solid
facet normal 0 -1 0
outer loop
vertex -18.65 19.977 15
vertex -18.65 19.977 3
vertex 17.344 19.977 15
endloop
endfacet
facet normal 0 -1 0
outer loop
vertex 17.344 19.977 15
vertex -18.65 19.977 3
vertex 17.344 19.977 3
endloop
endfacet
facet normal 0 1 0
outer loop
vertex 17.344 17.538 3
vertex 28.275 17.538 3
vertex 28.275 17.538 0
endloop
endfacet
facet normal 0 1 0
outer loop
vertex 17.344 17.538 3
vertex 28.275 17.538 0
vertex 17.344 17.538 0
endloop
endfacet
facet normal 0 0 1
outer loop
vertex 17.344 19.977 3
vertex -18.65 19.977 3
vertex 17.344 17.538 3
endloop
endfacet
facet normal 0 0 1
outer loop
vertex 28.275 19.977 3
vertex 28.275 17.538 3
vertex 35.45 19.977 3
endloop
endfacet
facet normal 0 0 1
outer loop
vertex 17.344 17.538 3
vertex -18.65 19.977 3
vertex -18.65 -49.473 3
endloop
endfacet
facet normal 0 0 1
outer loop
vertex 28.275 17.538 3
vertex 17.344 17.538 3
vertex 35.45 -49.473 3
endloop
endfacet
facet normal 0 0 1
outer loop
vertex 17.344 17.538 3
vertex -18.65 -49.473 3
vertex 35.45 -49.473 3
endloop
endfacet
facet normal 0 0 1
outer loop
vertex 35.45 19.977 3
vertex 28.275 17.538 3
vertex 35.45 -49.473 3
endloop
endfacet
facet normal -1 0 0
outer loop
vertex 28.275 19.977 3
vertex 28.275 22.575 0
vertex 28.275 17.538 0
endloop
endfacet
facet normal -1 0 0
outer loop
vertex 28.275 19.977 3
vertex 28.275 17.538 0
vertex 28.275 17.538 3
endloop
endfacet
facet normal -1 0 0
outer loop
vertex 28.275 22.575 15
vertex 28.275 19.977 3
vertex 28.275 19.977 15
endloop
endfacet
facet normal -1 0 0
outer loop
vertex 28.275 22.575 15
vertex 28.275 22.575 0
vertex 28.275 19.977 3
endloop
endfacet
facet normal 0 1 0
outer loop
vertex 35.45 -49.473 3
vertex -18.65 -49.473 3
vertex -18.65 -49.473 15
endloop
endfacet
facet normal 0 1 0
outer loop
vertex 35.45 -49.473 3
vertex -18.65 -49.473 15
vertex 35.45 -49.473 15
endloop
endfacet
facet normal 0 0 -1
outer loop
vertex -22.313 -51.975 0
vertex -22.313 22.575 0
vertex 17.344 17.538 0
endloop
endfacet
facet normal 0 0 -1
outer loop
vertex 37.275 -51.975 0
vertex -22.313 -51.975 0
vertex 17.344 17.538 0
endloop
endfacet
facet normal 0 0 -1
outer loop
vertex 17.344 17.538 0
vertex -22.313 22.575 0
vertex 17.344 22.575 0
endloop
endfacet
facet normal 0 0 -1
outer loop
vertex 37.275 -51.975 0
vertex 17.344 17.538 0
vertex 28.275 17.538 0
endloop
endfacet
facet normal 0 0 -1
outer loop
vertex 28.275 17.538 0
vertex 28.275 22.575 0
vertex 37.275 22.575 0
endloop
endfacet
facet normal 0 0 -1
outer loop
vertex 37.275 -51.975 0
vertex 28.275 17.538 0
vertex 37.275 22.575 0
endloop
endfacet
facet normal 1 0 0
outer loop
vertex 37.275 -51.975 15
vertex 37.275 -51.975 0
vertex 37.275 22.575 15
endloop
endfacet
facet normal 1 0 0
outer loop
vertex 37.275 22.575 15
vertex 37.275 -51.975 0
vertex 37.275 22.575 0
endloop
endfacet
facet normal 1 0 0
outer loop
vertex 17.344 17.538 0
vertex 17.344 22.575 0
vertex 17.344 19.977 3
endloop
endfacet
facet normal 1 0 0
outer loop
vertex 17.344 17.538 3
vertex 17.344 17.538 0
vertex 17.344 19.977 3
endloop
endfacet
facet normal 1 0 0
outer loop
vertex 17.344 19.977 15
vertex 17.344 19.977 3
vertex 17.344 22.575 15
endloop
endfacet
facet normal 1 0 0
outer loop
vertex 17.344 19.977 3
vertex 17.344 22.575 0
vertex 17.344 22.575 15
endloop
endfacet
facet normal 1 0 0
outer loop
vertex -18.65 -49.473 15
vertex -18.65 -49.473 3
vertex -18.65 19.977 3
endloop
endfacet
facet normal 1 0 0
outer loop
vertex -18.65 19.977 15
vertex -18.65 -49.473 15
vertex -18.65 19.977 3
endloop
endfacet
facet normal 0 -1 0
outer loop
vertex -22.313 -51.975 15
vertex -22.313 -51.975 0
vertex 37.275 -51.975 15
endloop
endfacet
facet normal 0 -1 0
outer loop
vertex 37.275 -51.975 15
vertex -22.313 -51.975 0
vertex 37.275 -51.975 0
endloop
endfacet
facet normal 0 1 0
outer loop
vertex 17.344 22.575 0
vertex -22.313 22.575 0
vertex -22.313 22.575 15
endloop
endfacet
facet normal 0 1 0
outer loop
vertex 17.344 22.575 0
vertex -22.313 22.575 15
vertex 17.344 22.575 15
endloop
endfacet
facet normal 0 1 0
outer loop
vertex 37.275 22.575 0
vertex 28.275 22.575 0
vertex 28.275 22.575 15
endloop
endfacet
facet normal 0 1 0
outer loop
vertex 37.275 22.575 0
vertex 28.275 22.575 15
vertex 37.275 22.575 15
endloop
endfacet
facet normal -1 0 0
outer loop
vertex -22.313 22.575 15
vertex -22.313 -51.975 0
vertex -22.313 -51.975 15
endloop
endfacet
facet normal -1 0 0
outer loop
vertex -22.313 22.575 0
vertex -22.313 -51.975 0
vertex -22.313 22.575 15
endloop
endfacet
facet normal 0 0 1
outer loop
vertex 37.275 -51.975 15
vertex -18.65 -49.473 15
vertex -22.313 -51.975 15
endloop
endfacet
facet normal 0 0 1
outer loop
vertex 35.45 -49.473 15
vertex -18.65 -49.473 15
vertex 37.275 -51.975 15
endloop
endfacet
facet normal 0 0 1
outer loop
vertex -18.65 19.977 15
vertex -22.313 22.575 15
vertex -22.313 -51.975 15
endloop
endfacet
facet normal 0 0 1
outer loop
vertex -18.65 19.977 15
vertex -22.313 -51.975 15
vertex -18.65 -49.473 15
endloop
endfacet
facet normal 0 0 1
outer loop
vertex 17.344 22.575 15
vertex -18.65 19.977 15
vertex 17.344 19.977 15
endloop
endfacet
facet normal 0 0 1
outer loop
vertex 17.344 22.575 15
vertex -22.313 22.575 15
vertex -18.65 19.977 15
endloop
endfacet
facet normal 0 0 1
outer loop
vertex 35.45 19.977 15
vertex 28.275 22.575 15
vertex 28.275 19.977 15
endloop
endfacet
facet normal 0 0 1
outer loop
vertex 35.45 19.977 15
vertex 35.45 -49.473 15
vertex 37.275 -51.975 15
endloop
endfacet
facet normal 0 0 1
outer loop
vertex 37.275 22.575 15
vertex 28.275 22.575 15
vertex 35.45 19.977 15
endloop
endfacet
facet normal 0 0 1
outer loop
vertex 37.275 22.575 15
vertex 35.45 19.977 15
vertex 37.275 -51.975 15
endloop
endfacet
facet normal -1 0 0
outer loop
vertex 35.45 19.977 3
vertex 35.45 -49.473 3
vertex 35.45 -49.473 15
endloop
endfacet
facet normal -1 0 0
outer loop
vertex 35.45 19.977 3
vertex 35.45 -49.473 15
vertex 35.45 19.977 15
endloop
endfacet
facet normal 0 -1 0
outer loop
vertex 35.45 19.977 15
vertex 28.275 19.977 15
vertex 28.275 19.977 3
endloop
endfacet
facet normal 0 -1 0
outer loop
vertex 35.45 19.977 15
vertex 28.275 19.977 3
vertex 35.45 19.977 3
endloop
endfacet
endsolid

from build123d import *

# Parameters (mm, degrees)
F0_W     = 59.587501
F0_H     = 74.550004
F0_W_2   = 54.1
F0_H_2   = 69.45
F1_DEPTH = 15
F2_W     = 59.587501
F2_H     = 74.550004
F3_DEPTH = 3
F4_W     = 10.931132
F4_H     = 15
F5_DEPTH = 5.0369


with BuildPart() as f1:
    # F0 (on Top) → F1 (new body)
    with BuildSketch(Plane.XY):
        with Locations((7.48125, -14.700002)):
            Rectangle(F0_W, F0_H)
        with Locations((8.4, -14.747789)):
            Rectangle(F0_W_2, F0_H_2, mode=Mode.SUBTRACT)
    extrude(amount=F1_DEPTH)

    # F2 (on face) → F3 (join)
    with BuildSketch(Plane(origin=(0, 0, 0), x_dir=(1, 0, 0), z_dir=(0, 0, -1))):
        with Locations((7.48125, 14.700002)):
            Rectangle(F2_W, F2_H)
    extrude(amount=-F3_DEPTH)

    # F4 (on face) → F5 (cut)
    with BuildSketch(Plane(origin=(0, 22.575, 0), x_dir=(-1, 0, 0), z_dir=(0, 1, 0))):
        with Locations((-22.809435, 7.5)):
            Rectangle(F4_W, F4_H)
    extrude(amount=-F5_DEPTH, mode=Mode.SUBTRACT)


solid = f1.part
